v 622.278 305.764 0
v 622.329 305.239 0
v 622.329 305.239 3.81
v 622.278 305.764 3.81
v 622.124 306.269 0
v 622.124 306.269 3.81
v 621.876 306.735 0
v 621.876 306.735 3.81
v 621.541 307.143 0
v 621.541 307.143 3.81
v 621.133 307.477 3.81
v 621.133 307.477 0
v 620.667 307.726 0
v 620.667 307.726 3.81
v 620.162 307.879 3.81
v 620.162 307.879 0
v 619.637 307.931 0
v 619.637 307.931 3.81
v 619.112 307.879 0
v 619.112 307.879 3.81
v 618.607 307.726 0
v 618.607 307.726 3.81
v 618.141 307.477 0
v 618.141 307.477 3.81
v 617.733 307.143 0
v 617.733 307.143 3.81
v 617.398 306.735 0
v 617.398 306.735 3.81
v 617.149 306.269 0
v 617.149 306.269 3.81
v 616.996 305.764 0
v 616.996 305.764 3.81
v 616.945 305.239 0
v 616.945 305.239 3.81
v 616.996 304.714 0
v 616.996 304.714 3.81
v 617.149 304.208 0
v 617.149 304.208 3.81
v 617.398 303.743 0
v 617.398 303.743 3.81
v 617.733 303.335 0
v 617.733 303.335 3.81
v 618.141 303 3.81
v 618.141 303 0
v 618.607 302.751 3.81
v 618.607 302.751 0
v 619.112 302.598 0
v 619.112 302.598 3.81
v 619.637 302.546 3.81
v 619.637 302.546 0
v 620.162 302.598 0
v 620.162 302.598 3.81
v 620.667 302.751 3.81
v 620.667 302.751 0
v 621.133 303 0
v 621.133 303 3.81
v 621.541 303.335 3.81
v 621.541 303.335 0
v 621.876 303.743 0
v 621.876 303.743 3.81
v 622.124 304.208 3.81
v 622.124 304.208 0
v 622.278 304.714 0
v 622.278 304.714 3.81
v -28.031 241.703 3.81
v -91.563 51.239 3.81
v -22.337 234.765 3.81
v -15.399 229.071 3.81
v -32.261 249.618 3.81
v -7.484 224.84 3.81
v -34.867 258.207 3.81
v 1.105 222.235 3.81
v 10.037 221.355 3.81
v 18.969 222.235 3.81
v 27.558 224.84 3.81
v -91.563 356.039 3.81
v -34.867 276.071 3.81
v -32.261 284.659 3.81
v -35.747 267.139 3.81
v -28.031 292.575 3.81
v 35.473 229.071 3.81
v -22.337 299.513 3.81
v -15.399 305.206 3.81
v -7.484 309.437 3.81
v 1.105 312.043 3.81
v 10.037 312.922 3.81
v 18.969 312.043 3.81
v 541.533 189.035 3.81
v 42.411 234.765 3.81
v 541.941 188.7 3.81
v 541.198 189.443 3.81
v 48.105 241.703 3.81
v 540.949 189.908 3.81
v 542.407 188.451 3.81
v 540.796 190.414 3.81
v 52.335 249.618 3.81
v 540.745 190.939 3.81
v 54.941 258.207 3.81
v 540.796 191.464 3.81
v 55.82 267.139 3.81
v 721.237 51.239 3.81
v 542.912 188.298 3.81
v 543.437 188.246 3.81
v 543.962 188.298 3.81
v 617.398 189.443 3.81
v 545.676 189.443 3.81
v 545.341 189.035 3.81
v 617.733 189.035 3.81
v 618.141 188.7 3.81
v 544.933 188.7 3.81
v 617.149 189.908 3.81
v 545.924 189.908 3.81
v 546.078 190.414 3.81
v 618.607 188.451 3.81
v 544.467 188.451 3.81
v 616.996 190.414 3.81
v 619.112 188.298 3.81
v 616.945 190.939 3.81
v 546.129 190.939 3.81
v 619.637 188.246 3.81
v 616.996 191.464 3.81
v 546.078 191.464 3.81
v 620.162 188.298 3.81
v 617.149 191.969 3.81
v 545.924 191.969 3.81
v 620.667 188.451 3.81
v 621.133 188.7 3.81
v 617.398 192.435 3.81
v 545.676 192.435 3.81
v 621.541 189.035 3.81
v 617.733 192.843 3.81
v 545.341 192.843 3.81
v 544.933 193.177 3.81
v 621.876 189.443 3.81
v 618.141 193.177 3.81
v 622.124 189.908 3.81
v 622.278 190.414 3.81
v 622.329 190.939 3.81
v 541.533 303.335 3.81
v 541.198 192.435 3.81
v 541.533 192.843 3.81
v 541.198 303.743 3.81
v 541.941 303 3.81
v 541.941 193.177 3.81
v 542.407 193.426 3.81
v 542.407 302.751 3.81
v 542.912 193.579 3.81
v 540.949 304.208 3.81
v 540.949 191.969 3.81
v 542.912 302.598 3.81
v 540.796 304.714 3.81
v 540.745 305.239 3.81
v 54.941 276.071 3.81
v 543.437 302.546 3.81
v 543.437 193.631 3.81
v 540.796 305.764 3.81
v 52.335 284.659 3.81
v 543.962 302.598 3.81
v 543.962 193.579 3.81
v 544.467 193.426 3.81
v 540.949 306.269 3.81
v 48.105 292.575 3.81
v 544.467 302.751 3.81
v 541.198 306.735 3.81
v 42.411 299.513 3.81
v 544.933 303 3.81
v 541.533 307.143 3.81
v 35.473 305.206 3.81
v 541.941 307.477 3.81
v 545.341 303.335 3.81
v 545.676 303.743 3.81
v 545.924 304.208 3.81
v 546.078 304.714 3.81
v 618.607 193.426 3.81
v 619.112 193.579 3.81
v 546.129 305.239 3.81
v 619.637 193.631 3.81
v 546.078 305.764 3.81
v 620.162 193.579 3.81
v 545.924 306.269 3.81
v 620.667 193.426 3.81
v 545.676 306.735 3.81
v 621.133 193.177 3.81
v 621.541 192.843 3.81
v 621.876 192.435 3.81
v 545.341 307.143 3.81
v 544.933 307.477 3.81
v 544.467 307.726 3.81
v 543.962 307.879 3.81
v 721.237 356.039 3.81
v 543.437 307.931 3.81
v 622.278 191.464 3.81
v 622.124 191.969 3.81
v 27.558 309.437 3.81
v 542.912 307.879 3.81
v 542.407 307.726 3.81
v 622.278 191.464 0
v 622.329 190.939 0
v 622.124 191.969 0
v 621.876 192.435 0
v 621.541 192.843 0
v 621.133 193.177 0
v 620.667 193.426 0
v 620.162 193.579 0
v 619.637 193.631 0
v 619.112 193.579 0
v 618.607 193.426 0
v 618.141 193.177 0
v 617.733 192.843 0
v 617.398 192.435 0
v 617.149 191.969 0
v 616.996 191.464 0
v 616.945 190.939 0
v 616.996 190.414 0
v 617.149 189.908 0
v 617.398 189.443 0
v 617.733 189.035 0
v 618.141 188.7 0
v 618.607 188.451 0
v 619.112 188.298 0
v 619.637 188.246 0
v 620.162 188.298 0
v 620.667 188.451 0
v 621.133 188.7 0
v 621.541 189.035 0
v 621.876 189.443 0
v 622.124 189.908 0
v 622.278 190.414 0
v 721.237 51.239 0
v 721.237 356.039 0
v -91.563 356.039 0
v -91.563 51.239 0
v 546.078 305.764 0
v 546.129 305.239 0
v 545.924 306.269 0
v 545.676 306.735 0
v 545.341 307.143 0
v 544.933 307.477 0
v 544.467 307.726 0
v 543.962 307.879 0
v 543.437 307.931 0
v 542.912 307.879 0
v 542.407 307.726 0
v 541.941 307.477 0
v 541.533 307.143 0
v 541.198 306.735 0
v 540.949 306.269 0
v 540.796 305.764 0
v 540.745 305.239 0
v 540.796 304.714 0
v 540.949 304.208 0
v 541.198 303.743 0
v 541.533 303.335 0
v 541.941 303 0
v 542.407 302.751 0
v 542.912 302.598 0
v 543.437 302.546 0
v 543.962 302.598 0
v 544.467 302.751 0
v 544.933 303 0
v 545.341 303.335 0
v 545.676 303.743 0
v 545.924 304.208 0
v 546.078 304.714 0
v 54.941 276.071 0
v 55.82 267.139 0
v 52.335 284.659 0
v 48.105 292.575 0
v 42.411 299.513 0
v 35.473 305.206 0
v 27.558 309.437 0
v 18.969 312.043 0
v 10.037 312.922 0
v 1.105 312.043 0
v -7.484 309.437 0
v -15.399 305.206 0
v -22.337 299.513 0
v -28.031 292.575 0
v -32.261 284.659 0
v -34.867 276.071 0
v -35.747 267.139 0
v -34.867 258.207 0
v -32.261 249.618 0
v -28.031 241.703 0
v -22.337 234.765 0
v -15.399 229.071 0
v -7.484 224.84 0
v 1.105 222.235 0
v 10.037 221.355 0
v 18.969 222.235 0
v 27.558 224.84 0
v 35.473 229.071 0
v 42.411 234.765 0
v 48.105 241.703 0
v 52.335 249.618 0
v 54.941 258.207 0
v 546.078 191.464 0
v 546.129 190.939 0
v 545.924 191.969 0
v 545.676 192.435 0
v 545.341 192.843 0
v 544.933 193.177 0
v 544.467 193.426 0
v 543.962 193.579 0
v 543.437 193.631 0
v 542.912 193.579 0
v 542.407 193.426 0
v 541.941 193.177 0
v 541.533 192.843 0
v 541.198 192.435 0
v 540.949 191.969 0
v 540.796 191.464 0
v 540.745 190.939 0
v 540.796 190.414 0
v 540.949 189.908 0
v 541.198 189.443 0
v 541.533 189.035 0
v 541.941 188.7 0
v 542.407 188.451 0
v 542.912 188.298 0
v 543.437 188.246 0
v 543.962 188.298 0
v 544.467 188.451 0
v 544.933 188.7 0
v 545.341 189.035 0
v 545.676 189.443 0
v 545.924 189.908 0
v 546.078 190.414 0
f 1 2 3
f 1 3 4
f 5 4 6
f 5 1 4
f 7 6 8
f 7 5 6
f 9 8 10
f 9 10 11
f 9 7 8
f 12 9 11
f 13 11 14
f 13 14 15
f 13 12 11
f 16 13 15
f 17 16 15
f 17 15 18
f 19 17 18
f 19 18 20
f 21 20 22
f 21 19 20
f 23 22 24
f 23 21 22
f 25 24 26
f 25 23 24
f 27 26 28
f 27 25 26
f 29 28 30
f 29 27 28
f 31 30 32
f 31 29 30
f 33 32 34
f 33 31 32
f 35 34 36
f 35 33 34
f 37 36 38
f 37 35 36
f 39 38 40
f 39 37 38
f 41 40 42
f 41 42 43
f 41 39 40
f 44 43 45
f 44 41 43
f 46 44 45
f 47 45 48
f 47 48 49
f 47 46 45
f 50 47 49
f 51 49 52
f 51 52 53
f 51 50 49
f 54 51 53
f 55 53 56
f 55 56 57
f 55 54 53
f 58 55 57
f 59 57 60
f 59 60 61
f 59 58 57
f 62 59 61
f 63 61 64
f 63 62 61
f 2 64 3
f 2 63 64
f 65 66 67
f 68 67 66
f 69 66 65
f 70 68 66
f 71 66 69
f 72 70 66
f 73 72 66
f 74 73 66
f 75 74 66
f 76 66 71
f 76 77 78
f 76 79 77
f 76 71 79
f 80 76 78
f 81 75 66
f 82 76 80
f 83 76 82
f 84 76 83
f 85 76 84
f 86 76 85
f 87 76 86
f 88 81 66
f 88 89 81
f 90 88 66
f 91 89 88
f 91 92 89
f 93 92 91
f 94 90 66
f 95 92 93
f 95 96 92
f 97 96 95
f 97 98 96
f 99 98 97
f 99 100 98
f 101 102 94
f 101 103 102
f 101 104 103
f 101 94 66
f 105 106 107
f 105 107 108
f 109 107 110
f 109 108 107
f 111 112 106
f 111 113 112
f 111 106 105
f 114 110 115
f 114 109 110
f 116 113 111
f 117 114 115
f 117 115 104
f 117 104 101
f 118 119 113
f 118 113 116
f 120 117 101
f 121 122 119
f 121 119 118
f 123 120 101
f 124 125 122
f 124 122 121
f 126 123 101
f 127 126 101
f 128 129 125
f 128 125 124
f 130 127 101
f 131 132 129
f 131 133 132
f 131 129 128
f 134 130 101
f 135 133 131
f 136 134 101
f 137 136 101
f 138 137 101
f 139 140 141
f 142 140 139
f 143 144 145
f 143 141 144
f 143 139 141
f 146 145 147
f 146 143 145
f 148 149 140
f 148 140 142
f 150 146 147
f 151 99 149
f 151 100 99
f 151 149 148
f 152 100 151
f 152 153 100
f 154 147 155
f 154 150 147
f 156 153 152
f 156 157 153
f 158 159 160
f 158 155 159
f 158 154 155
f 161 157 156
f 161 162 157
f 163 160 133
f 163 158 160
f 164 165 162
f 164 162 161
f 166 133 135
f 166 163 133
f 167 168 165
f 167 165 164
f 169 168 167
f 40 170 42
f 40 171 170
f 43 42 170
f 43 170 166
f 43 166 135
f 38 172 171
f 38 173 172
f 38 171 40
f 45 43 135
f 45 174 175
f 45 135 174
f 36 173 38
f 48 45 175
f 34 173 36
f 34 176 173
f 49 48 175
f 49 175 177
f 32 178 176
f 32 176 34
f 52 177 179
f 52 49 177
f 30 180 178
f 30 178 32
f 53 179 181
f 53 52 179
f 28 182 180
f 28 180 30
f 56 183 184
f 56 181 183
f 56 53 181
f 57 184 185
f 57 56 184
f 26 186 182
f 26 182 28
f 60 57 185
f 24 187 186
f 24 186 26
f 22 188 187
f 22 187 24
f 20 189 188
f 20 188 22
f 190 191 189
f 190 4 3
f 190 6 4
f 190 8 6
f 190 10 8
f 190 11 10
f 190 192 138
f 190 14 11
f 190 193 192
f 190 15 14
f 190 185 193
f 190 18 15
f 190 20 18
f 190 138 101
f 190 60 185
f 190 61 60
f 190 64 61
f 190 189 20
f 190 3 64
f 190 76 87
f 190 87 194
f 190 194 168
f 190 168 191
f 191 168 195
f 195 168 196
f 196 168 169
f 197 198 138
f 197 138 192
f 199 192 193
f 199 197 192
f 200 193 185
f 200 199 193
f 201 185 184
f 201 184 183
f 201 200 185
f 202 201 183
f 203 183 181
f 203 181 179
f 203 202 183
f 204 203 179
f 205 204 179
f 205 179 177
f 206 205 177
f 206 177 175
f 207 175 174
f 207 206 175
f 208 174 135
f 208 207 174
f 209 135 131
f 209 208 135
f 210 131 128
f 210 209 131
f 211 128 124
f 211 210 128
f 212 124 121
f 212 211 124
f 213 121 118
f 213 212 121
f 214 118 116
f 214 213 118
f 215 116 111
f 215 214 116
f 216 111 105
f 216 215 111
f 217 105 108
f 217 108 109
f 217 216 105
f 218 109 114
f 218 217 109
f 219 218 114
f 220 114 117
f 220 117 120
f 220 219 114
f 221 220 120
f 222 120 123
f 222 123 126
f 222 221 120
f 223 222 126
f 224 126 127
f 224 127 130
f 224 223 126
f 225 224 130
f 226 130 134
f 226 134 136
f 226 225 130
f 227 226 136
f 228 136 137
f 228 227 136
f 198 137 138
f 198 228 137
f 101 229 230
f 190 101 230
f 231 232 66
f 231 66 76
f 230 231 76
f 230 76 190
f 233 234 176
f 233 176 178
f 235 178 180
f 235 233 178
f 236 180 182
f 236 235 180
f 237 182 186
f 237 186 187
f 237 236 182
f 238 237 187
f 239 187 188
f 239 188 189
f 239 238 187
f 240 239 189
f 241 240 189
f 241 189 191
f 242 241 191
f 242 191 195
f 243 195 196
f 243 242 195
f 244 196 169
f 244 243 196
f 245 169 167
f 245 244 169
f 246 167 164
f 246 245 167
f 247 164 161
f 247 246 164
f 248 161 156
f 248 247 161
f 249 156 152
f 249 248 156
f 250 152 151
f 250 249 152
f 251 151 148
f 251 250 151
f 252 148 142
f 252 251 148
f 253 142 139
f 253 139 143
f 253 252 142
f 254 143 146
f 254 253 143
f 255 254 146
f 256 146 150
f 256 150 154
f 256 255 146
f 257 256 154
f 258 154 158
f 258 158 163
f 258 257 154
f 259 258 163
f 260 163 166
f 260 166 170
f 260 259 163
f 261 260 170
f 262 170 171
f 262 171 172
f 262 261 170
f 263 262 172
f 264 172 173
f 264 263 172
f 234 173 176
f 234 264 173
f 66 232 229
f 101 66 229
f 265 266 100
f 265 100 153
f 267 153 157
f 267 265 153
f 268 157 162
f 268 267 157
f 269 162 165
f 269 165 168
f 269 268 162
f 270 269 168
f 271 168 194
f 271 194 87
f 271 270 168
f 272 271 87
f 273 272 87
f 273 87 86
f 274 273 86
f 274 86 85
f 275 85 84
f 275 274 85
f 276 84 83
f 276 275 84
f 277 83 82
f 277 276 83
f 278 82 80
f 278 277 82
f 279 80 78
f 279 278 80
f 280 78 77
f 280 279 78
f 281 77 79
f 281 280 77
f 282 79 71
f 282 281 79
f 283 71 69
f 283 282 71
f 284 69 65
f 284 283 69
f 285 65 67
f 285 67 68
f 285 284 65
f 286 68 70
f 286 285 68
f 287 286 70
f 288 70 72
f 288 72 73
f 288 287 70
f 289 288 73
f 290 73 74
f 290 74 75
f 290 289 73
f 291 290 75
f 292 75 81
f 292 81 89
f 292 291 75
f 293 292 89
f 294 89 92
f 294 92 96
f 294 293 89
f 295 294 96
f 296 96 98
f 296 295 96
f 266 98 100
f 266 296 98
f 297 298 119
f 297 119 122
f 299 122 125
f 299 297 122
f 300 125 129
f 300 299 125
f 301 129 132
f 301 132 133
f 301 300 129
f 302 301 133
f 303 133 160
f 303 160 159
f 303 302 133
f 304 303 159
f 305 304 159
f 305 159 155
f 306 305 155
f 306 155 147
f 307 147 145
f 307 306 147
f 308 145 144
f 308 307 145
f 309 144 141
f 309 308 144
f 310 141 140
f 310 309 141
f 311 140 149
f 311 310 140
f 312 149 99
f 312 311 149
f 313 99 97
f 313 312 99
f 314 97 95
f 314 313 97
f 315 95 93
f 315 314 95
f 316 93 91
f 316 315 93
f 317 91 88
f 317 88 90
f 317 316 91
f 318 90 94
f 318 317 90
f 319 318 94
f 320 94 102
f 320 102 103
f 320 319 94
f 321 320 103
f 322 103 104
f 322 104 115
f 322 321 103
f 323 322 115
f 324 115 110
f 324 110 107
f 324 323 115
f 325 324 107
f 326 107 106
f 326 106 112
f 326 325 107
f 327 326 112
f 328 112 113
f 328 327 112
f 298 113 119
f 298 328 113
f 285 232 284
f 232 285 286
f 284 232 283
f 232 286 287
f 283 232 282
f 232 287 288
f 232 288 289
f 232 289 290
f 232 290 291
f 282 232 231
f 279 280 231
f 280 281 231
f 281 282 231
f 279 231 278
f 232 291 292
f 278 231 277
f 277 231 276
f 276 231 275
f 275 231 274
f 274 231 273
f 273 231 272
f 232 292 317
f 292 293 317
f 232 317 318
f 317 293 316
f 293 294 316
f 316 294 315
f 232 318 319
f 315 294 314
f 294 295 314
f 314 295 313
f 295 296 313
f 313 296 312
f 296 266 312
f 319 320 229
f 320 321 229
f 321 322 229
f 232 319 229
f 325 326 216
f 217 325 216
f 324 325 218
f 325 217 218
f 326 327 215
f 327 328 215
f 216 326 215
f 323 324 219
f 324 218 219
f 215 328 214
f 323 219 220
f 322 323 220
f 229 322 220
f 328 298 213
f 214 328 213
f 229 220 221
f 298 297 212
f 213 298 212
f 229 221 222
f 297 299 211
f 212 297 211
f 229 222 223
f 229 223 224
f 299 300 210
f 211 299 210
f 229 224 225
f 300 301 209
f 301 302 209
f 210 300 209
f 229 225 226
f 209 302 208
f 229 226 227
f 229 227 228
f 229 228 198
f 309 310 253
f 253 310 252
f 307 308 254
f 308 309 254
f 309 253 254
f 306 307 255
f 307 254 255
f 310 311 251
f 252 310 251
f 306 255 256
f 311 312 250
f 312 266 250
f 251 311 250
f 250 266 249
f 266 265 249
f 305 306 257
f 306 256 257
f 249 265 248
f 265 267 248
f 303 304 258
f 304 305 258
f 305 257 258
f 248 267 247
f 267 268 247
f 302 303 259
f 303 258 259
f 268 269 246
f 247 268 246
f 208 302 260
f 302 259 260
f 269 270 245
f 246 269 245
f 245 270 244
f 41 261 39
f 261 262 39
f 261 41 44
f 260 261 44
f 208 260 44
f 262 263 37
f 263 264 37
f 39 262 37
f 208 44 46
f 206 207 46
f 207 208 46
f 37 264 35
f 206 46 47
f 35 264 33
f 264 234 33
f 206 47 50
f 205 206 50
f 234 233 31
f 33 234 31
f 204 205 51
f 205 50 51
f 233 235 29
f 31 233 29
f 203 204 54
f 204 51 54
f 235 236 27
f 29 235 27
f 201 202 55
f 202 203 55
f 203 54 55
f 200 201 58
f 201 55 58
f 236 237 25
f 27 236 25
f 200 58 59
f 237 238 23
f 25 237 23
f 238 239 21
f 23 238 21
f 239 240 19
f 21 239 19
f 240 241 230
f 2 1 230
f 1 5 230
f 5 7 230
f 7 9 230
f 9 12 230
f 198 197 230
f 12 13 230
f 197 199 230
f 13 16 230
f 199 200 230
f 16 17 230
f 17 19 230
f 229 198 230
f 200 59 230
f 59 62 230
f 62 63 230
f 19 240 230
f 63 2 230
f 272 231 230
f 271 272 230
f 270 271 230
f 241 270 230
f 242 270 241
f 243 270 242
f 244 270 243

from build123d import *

# Parameters (mm, degrees)
F0_W     = 812.8
F0_H     = 304.8
F0_R     = 2.6924
F0_R_2   = 45.7835
F1_DEPTH = 3.81


with BuildPart() as f1:
    # F0 (on Top) → F1 (new body)
    with BuildSketch(Plane.XY):
        with Locations((314.836944, 203.638772)):
            Rectangle(F0_W, F0_H)
        with Locations((543.436944, 190.938772)):
            Circle(F0_R, mode=Mode.SUBTRACT)
        with Locations((619.636944, 190.938772)):
            Circle(F0_R, mode=Mode.SUBTRACT)
        with Locations((10.036944, 267.138772)):
            Circle(F0_R_2, mode=Mode.SUBTRACT)
        with Locations((543.436944, 305.238772)):
            Circle(F0_R, mode=Mode.SUBTRACT)
        with Locations((619.636944, 305.238772)):
            Circle(F0_R, mode=Mode.SUBTRACT)
    extrude(amount=F1_DEPTH)


solid = f1.part
